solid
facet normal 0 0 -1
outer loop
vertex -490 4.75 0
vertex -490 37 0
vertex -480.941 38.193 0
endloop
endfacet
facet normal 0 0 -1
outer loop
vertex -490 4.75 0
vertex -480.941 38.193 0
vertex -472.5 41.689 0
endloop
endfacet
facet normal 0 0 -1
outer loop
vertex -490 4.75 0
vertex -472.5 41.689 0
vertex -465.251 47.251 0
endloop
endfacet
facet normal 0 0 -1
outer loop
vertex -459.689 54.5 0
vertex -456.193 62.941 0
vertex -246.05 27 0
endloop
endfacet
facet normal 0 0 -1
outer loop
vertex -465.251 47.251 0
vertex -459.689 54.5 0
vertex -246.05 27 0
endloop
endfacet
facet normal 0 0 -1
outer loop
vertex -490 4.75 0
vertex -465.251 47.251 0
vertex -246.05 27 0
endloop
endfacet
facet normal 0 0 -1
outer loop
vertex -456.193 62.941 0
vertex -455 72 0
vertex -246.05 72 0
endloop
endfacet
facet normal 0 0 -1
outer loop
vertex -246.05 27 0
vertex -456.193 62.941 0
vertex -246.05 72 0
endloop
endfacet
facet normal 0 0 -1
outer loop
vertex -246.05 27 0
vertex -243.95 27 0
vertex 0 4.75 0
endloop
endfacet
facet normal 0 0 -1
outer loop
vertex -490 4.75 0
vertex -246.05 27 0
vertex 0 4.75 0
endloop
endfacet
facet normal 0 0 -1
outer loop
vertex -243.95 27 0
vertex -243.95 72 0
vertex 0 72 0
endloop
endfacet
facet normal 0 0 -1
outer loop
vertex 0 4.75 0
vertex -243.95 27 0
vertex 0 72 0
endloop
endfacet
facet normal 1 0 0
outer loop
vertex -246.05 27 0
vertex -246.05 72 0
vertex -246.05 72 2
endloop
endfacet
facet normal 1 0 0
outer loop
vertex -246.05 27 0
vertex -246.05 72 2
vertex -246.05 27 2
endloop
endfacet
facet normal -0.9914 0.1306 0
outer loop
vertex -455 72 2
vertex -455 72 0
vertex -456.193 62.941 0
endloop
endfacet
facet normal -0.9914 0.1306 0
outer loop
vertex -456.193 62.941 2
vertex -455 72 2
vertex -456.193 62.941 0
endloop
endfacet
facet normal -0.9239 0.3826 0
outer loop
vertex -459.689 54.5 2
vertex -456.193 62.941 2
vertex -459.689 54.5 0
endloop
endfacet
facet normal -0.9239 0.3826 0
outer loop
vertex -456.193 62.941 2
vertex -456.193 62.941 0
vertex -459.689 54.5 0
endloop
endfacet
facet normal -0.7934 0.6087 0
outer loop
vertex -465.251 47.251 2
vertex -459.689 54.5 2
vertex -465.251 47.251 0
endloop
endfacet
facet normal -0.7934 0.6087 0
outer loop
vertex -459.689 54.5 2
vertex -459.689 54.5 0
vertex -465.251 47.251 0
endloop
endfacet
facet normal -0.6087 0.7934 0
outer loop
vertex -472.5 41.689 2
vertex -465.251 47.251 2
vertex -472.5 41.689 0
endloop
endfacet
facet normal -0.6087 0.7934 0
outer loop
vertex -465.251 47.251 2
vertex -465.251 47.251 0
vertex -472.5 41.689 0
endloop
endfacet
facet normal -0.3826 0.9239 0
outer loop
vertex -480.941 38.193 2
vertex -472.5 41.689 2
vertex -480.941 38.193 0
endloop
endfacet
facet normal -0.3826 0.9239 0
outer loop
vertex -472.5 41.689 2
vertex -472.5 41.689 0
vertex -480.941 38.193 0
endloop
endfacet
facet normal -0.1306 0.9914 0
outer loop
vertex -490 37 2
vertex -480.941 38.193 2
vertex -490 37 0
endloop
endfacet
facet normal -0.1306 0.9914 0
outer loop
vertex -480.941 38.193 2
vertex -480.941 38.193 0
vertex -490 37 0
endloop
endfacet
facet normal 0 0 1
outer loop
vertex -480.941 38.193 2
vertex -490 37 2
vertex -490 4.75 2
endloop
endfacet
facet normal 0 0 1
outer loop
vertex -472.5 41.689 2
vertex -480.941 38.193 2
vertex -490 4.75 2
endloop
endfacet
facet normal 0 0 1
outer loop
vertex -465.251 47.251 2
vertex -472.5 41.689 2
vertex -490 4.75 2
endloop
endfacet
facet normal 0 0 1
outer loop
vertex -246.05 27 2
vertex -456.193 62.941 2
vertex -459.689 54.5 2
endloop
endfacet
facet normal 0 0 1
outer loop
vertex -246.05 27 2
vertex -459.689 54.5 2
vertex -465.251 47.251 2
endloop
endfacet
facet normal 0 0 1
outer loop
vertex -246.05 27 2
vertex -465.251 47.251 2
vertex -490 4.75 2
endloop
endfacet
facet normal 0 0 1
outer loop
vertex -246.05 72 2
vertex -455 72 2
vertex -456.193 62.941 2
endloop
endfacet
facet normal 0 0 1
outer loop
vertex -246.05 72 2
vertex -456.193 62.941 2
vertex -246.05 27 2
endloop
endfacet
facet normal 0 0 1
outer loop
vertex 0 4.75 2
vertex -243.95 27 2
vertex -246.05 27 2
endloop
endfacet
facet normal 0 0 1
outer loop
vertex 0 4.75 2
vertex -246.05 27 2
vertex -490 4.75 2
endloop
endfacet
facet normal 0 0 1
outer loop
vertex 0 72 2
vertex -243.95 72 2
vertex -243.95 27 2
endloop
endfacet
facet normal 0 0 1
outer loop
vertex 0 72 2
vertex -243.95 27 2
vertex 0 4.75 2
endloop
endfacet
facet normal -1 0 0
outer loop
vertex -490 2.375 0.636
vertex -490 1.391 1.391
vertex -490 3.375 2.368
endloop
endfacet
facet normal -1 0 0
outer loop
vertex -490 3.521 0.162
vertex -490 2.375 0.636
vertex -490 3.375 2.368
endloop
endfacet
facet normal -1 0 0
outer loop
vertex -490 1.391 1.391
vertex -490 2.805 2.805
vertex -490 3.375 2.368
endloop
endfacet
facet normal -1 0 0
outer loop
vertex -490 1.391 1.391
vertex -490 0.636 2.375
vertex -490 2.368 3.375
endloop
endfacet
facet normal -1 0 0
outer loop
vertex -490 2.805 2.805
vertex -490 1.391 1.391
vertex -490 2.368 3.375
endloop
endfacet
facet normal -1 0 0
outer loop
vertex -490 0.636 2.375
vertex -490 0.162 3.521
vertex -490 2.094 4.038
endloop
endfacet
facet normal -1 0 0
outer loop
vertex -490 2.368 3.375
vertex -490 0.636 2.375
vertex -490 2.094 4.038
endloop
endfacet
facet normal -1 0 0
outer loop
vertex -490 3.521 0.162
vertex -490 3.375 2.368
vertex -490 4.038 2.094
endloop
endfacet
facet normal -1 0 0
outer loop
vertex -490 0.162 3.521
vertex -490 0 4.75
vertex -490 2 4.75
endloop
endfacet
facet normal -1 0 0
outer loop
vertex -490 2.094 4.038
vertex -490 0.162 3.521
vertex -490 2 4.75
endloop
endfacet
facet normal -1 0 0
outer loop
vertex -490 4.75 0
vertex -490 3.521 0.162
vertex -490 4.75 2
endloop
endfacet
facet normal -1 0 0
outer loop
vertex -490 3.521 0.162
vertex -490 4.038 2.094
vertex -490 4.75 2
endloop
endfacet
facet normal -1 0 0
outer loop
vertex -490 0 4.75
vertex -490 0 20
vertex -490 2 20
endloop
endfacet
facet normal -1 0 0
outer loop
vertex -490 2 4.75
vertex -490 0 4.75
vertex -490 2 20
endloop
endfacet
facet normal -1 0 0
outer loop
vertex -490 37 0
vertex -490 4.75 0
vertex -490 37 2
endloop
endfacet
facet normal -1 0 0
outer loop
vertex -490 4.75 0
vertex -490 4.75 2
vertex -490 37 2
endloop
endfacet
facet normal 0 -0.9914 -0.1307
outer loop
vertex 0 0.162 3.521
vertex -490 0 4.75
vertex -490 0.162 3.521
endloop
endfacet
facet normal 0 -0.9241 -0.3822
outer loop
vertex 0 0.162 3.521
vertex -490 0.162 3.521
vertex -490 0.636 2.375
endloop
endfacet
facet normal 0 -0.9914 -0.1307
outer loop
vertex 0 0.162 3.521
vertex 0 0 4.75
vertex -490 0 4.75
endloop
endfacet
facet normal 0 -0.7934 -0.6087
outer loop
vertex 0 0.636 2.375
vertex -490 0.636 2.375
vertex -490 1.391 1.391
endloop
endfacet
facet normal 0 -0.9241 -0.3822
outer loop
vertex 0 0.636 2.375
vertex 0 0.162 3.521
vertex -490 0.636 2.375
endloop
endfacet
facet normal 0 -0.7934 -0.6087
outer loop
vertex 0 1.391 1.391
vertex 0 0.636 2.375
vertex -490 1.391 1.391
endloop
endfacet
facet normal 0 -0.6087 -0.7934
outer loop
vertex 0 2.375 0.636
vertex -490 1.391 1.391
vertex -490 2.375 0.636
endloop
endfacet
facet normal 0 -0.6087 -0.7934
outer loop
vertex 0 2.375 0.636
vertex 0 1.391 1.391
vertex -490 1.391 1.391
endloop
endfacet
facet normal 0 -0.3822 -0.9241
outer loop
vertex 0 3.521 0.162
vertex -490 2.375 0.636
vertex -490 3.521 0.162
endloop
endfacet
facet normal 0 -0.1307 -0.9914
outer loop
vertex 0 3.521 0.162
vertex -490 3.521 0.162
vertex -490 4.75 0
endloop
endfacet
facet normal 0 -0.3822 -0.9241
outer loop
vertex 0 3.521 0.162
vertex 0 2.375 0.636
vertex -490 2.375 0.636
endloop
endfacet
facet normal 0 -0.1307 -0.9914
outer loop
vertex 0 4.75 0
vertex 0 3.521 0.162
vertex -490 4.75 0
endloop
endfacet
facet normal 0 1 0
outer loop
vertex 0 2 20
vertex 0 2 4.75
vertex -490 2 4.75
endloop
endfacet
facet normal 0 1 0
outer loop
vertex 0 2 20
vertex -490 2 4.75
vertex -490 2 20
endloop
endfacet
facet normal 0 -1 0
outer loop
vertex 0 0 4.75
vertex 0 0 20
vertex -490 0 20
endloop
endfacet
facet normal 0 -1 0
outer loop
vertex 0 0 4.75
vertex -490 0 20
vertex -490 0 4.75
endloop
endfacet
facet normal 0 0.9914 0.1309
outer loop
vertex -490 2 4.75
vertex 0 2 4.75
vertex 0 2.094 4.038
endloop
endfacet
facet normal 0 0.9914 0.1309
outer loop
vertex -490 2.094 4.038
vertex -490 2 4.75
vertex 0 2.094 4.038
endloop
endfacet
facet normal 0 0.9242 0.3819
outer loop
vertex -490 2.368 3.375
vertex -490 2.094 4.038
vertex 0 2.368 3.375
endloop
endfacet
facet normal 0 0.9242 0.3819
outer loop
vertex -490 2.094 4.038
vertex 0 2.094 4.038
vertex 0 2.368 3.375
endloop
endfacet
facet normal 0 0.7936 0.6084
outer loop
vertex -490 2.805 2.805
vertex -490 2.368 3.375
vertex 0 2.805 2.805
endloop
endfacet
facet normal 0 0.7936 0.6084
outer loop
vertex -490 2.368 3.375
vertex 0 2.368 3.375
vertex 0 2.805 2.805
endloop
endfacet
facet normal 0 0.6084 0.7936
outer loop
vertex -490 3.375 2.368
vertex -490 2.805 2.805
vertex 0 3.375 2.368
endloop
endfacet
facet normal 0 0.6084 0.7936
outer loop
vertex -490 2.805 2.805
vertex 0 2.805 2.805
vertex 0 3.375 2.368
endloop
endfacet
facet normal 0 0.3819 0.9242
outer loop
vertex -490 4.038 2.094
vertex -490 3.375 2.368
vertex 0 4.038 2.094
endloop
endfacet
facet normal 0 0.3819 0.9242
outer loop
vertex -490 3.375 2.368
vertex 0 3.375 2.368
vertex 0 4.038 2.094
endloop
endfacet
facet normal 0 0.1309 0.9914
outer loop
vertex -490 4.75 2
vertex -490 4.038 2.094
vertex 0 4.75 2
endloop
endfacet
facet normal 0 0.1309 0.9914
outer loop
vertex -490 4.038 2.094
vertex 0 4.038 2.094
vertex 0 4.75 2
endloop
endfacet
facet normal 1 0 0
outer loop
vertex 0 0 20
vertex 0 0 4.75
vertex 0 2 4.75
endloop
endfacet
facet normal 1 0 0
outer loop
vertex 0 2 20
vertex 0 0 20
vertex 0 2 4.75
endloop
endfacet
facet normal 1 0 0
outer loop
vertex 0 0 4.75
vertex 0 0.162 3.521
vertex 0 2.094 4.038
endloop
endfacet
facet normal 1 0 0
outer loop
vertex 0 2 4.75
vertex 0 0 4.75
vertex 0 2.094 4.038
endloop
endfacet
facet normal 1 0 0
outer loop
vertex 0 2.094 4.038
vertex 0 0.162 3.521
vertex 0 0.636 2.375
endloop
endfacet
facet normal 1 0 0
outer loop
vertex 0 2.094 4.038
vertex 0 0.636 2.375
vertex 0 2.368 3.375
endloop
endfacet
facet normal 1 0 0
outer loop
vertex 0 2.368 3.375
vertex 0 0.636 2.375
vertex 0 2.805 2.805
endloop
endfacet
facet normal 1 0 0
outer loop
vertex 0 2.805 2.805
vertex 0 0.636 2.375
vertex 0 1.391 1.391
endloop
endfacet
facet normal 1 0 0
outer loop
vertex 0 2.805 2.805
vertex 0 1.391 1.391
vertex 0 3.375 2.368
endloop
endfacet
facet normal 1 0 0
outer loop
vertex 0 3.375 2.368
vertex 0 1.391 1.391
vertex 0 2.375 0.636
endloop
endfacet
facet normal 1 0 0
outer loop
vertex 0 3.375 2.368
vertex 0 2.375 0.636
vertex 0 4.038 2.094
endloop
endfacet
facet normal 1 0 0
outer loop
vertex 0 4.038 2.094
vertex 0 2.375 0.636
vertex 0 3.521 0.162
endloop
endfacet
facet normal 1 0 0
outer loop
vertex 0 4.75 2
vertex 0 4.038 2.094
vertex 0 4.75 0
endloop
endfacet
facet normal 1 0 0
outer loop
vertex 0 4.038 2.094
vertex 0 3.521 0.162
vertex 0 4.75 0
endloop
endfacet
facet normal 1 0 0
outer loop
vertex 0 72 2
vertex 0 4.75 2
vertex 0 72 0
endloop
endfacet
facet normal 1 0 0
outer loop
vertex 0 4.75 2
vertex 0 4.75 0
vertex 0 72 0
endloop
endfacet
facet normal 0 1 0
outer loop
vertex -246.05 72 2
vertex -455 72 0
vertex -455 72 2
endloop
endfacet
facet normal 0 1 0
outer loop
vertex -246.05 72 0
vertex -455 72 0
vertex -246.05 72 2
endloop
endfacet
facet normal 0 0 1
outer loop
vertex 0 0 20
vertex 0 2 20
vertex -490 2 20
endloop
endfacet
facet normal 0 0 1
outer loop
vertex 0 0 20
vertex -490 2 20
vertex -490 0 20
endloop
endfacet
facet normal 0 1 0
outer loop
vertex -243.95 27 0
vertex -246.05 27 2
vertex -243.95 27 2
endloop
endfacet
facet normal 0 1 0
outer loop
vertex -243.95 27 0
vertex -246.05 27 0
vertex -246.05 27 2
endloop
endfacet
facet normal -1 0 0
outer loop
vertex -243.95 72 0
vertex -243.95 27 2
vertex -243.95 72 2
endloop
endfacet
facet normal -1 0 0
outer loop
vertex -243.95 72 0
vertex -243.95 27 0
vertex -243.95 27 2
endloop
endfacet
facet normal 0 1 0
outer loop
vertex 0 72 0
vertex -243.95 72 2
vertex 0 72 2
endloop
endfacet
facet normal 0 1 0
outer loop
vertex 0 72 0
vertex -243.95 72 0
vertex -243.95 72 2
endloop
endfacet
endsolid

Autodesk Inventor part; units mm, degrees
ref_plane "YZ Plane" through (0, 0, 0) normal (1, 0, 0) x (0, 1, 0)
ref_plane "XZ Plane" through (0, 0, 0) normal (0, 1, 0) x (-1, 0, 0)
ref_plane "XY Plane" through (0, 0, 0) normal (0, 0, 1) x (1, 0, 0)
sketch "Sketch1" plane through (0, 0, 0) normal (0, 0, 1) x (1, 0, 0)
  line L0 (-490, 72) -> (490, 72)
  line L1 (490, 72) -> (490, 0)
  line L2 (490, 0) -> (-490, 0)
  line L3 (-490, 0) -> (-490, 72)
  point P0 (0, 0)
  point P1 (0, 0)
  dimension "d0" = 980
  dimension "d1" = 72
extrude "Plate1" add sketch "Sketch1" along normal blind 2
sketch "Sketch2" plane through (490, 2, 0) normal (0, -1, 0) x (1, 0, 0)
  line L0 (-980, 0) -> (0, 0)
  line L1 (0, 0) -> (0, 20)
  line L2 (0, 20) -> (-980, 20)
  line L3 (-980, 20) -> (-980, 0)
edge flange "Flange1" height 20 angle 90 thickness 2 bend radius 2.75 thickness toward (0, -1, 0) relief round relief width 2 relief depth 1 edges at (0, 0, 2) wall of the first edge with corners at (-490, 2, 0) (490, 2, 0) (490, 2, 20) (-490, 2, 20)
bend "Bend1"
corner "Corner1"
sketch "Sketch5" plane through (0, 0, 0) normal (0, 0, -1) x (-1, 0, 0)
  line L0 (490, 72) -> (-490, 72) projected
  line L1 (490, 0) -> (-490, 0) projected
  circle A0 centre (0, 72) radius 35
  line L2 (243.95, 72) -> (246.05, 72)
  line L3 (246.05, 72) -> (246.05, 27)
  line L4 (246.05, 27) -> (243.95, 27)
  line L5 (243.95, 27) -> (243.95, 72)
  line L6 (-243.95, 72) -> (-246.05, 72)
  line L7 (-246.05, 72) -> (-246.05, 27)
  line L8 (-246.05, 27) -> (-243.95, 27)
  line L9 (-243.95, 27) -> (-243.95, 72)
  line L10 (0, 72) -> (0, 0) construction
  line L11 (-490, 0) -> (-490, 72)
  line L12 (490, 0) -> (490, 72)
  circle A1 centre (-490, 72) radius 35
  circle A2 centre (490, 72) radius 35
  point P0 (0, 0)
  point P1 (245, 27)
  point P2 (-245, 27)
  point P3 (246.05, 72)
  point P4 (-35, 72)
  point P5 (35, 72)
  point P6 (-246.05, 72)
  point P7 (455, 72)
  point P8 (490, 37)
  point P9 (-490, 37)
  point P10 (-455, 72)
  dimension "d45" = 70
  dimension "d48" = 2.1
  dimension "d49" = 490
  dimension "d51" = 27
  dimension "d52" = 45
extrude "Extrusion1" cut sketch "Sketch5" against normal through all contours L3 L4 L5 L0 | L0 L12 A2 | L9 L8 L7 L0 | L11 L0 A1 picked at (487.4039, 48.9592) picked at (-466.9592, 69.4039)
sketch "Sketch9" plane through (0, 0, 2) normal (0, 0, 1) x (1, 0, 0)
  line L0 (-2.0322, 27.7998) -> (-2.0322, 15.7998) construction
  line L1 (-2.0322, 15.7998) -> (-202.0322, 15.7998) construction
  line L2 (-202.0322, 15.7998) -> (-202.0322, 27.7998) construction
  line L3 (-202.0322, 27.7998) -> (-2.0322, 27.7998) construction
  line L4 (-490, 72) -> (490, 72) projected
  point P0 (0, 0)
  point P1 (1.05, 68)
  point P2 (490, 72)
  point P3 (-490, 72)
  dimension "d40" = 200
  dimension "d41" = 12
mark "Mark2"
sketch "Sketch10" plane through (-243.95, 72, 2) normal (0, 0, 1) x (1, 0, 0)
  line L0 (-246.05, -72) -> (733.95, -72) projected
  line L1 (0, 0) -> (487.9, 0) projected
  line L2 (733.95, -72) -> (243.95, -72)
  line L3 (243.95, -72) -> (243.95, 0)
  line L4 (243.95, 0) -> (733.95, 0)
  line L5 (733.95, 0) -> (733.95, -72)
  point P0 (243.95, -72)
  point P1 (243.95, -72)
  dimension "d53" = 490
extrude "Extrusion4" cut sketch "Sketch10" along normal through all both and the other way through all
equation "\"d2\" = Thickness"
equation "\"d3\" = BendReliefWidth"
equation "\"d4\" = BendReliefDepth"
equation "\"d5\" = MinimumRemnant"
equation "\"d6\" = TransitionRadius"
equation "\"d9\" = BendRadius"
equation "\"d10\" = CornerReliefSize"
equation "\"d11\" = GapSize"
equation "\"d12\" = JacobiRadiusSize"
equation "\"BendReliefWidth\" = Thickness"
equation "\"BendReliefDepth\" = 0.5 * Thickness"
equation "\"CornerReliefSize\" = 4 * Thickness"
equation "\"MinimumRemnant\" = 2 * Thickness"
equation "\"TransitionRadius\" = BendRadius"
equation "\"JacobiRadiusSize\" = BendRadius"
equation "\"GapSize\" = Thickness"
equation "\"Thickness\" = 2"
equation "\"BendRadius\" = 2.75"
properties part number "MSC 321 STRINGER BOARD  ####" material "Stainless Steel"
